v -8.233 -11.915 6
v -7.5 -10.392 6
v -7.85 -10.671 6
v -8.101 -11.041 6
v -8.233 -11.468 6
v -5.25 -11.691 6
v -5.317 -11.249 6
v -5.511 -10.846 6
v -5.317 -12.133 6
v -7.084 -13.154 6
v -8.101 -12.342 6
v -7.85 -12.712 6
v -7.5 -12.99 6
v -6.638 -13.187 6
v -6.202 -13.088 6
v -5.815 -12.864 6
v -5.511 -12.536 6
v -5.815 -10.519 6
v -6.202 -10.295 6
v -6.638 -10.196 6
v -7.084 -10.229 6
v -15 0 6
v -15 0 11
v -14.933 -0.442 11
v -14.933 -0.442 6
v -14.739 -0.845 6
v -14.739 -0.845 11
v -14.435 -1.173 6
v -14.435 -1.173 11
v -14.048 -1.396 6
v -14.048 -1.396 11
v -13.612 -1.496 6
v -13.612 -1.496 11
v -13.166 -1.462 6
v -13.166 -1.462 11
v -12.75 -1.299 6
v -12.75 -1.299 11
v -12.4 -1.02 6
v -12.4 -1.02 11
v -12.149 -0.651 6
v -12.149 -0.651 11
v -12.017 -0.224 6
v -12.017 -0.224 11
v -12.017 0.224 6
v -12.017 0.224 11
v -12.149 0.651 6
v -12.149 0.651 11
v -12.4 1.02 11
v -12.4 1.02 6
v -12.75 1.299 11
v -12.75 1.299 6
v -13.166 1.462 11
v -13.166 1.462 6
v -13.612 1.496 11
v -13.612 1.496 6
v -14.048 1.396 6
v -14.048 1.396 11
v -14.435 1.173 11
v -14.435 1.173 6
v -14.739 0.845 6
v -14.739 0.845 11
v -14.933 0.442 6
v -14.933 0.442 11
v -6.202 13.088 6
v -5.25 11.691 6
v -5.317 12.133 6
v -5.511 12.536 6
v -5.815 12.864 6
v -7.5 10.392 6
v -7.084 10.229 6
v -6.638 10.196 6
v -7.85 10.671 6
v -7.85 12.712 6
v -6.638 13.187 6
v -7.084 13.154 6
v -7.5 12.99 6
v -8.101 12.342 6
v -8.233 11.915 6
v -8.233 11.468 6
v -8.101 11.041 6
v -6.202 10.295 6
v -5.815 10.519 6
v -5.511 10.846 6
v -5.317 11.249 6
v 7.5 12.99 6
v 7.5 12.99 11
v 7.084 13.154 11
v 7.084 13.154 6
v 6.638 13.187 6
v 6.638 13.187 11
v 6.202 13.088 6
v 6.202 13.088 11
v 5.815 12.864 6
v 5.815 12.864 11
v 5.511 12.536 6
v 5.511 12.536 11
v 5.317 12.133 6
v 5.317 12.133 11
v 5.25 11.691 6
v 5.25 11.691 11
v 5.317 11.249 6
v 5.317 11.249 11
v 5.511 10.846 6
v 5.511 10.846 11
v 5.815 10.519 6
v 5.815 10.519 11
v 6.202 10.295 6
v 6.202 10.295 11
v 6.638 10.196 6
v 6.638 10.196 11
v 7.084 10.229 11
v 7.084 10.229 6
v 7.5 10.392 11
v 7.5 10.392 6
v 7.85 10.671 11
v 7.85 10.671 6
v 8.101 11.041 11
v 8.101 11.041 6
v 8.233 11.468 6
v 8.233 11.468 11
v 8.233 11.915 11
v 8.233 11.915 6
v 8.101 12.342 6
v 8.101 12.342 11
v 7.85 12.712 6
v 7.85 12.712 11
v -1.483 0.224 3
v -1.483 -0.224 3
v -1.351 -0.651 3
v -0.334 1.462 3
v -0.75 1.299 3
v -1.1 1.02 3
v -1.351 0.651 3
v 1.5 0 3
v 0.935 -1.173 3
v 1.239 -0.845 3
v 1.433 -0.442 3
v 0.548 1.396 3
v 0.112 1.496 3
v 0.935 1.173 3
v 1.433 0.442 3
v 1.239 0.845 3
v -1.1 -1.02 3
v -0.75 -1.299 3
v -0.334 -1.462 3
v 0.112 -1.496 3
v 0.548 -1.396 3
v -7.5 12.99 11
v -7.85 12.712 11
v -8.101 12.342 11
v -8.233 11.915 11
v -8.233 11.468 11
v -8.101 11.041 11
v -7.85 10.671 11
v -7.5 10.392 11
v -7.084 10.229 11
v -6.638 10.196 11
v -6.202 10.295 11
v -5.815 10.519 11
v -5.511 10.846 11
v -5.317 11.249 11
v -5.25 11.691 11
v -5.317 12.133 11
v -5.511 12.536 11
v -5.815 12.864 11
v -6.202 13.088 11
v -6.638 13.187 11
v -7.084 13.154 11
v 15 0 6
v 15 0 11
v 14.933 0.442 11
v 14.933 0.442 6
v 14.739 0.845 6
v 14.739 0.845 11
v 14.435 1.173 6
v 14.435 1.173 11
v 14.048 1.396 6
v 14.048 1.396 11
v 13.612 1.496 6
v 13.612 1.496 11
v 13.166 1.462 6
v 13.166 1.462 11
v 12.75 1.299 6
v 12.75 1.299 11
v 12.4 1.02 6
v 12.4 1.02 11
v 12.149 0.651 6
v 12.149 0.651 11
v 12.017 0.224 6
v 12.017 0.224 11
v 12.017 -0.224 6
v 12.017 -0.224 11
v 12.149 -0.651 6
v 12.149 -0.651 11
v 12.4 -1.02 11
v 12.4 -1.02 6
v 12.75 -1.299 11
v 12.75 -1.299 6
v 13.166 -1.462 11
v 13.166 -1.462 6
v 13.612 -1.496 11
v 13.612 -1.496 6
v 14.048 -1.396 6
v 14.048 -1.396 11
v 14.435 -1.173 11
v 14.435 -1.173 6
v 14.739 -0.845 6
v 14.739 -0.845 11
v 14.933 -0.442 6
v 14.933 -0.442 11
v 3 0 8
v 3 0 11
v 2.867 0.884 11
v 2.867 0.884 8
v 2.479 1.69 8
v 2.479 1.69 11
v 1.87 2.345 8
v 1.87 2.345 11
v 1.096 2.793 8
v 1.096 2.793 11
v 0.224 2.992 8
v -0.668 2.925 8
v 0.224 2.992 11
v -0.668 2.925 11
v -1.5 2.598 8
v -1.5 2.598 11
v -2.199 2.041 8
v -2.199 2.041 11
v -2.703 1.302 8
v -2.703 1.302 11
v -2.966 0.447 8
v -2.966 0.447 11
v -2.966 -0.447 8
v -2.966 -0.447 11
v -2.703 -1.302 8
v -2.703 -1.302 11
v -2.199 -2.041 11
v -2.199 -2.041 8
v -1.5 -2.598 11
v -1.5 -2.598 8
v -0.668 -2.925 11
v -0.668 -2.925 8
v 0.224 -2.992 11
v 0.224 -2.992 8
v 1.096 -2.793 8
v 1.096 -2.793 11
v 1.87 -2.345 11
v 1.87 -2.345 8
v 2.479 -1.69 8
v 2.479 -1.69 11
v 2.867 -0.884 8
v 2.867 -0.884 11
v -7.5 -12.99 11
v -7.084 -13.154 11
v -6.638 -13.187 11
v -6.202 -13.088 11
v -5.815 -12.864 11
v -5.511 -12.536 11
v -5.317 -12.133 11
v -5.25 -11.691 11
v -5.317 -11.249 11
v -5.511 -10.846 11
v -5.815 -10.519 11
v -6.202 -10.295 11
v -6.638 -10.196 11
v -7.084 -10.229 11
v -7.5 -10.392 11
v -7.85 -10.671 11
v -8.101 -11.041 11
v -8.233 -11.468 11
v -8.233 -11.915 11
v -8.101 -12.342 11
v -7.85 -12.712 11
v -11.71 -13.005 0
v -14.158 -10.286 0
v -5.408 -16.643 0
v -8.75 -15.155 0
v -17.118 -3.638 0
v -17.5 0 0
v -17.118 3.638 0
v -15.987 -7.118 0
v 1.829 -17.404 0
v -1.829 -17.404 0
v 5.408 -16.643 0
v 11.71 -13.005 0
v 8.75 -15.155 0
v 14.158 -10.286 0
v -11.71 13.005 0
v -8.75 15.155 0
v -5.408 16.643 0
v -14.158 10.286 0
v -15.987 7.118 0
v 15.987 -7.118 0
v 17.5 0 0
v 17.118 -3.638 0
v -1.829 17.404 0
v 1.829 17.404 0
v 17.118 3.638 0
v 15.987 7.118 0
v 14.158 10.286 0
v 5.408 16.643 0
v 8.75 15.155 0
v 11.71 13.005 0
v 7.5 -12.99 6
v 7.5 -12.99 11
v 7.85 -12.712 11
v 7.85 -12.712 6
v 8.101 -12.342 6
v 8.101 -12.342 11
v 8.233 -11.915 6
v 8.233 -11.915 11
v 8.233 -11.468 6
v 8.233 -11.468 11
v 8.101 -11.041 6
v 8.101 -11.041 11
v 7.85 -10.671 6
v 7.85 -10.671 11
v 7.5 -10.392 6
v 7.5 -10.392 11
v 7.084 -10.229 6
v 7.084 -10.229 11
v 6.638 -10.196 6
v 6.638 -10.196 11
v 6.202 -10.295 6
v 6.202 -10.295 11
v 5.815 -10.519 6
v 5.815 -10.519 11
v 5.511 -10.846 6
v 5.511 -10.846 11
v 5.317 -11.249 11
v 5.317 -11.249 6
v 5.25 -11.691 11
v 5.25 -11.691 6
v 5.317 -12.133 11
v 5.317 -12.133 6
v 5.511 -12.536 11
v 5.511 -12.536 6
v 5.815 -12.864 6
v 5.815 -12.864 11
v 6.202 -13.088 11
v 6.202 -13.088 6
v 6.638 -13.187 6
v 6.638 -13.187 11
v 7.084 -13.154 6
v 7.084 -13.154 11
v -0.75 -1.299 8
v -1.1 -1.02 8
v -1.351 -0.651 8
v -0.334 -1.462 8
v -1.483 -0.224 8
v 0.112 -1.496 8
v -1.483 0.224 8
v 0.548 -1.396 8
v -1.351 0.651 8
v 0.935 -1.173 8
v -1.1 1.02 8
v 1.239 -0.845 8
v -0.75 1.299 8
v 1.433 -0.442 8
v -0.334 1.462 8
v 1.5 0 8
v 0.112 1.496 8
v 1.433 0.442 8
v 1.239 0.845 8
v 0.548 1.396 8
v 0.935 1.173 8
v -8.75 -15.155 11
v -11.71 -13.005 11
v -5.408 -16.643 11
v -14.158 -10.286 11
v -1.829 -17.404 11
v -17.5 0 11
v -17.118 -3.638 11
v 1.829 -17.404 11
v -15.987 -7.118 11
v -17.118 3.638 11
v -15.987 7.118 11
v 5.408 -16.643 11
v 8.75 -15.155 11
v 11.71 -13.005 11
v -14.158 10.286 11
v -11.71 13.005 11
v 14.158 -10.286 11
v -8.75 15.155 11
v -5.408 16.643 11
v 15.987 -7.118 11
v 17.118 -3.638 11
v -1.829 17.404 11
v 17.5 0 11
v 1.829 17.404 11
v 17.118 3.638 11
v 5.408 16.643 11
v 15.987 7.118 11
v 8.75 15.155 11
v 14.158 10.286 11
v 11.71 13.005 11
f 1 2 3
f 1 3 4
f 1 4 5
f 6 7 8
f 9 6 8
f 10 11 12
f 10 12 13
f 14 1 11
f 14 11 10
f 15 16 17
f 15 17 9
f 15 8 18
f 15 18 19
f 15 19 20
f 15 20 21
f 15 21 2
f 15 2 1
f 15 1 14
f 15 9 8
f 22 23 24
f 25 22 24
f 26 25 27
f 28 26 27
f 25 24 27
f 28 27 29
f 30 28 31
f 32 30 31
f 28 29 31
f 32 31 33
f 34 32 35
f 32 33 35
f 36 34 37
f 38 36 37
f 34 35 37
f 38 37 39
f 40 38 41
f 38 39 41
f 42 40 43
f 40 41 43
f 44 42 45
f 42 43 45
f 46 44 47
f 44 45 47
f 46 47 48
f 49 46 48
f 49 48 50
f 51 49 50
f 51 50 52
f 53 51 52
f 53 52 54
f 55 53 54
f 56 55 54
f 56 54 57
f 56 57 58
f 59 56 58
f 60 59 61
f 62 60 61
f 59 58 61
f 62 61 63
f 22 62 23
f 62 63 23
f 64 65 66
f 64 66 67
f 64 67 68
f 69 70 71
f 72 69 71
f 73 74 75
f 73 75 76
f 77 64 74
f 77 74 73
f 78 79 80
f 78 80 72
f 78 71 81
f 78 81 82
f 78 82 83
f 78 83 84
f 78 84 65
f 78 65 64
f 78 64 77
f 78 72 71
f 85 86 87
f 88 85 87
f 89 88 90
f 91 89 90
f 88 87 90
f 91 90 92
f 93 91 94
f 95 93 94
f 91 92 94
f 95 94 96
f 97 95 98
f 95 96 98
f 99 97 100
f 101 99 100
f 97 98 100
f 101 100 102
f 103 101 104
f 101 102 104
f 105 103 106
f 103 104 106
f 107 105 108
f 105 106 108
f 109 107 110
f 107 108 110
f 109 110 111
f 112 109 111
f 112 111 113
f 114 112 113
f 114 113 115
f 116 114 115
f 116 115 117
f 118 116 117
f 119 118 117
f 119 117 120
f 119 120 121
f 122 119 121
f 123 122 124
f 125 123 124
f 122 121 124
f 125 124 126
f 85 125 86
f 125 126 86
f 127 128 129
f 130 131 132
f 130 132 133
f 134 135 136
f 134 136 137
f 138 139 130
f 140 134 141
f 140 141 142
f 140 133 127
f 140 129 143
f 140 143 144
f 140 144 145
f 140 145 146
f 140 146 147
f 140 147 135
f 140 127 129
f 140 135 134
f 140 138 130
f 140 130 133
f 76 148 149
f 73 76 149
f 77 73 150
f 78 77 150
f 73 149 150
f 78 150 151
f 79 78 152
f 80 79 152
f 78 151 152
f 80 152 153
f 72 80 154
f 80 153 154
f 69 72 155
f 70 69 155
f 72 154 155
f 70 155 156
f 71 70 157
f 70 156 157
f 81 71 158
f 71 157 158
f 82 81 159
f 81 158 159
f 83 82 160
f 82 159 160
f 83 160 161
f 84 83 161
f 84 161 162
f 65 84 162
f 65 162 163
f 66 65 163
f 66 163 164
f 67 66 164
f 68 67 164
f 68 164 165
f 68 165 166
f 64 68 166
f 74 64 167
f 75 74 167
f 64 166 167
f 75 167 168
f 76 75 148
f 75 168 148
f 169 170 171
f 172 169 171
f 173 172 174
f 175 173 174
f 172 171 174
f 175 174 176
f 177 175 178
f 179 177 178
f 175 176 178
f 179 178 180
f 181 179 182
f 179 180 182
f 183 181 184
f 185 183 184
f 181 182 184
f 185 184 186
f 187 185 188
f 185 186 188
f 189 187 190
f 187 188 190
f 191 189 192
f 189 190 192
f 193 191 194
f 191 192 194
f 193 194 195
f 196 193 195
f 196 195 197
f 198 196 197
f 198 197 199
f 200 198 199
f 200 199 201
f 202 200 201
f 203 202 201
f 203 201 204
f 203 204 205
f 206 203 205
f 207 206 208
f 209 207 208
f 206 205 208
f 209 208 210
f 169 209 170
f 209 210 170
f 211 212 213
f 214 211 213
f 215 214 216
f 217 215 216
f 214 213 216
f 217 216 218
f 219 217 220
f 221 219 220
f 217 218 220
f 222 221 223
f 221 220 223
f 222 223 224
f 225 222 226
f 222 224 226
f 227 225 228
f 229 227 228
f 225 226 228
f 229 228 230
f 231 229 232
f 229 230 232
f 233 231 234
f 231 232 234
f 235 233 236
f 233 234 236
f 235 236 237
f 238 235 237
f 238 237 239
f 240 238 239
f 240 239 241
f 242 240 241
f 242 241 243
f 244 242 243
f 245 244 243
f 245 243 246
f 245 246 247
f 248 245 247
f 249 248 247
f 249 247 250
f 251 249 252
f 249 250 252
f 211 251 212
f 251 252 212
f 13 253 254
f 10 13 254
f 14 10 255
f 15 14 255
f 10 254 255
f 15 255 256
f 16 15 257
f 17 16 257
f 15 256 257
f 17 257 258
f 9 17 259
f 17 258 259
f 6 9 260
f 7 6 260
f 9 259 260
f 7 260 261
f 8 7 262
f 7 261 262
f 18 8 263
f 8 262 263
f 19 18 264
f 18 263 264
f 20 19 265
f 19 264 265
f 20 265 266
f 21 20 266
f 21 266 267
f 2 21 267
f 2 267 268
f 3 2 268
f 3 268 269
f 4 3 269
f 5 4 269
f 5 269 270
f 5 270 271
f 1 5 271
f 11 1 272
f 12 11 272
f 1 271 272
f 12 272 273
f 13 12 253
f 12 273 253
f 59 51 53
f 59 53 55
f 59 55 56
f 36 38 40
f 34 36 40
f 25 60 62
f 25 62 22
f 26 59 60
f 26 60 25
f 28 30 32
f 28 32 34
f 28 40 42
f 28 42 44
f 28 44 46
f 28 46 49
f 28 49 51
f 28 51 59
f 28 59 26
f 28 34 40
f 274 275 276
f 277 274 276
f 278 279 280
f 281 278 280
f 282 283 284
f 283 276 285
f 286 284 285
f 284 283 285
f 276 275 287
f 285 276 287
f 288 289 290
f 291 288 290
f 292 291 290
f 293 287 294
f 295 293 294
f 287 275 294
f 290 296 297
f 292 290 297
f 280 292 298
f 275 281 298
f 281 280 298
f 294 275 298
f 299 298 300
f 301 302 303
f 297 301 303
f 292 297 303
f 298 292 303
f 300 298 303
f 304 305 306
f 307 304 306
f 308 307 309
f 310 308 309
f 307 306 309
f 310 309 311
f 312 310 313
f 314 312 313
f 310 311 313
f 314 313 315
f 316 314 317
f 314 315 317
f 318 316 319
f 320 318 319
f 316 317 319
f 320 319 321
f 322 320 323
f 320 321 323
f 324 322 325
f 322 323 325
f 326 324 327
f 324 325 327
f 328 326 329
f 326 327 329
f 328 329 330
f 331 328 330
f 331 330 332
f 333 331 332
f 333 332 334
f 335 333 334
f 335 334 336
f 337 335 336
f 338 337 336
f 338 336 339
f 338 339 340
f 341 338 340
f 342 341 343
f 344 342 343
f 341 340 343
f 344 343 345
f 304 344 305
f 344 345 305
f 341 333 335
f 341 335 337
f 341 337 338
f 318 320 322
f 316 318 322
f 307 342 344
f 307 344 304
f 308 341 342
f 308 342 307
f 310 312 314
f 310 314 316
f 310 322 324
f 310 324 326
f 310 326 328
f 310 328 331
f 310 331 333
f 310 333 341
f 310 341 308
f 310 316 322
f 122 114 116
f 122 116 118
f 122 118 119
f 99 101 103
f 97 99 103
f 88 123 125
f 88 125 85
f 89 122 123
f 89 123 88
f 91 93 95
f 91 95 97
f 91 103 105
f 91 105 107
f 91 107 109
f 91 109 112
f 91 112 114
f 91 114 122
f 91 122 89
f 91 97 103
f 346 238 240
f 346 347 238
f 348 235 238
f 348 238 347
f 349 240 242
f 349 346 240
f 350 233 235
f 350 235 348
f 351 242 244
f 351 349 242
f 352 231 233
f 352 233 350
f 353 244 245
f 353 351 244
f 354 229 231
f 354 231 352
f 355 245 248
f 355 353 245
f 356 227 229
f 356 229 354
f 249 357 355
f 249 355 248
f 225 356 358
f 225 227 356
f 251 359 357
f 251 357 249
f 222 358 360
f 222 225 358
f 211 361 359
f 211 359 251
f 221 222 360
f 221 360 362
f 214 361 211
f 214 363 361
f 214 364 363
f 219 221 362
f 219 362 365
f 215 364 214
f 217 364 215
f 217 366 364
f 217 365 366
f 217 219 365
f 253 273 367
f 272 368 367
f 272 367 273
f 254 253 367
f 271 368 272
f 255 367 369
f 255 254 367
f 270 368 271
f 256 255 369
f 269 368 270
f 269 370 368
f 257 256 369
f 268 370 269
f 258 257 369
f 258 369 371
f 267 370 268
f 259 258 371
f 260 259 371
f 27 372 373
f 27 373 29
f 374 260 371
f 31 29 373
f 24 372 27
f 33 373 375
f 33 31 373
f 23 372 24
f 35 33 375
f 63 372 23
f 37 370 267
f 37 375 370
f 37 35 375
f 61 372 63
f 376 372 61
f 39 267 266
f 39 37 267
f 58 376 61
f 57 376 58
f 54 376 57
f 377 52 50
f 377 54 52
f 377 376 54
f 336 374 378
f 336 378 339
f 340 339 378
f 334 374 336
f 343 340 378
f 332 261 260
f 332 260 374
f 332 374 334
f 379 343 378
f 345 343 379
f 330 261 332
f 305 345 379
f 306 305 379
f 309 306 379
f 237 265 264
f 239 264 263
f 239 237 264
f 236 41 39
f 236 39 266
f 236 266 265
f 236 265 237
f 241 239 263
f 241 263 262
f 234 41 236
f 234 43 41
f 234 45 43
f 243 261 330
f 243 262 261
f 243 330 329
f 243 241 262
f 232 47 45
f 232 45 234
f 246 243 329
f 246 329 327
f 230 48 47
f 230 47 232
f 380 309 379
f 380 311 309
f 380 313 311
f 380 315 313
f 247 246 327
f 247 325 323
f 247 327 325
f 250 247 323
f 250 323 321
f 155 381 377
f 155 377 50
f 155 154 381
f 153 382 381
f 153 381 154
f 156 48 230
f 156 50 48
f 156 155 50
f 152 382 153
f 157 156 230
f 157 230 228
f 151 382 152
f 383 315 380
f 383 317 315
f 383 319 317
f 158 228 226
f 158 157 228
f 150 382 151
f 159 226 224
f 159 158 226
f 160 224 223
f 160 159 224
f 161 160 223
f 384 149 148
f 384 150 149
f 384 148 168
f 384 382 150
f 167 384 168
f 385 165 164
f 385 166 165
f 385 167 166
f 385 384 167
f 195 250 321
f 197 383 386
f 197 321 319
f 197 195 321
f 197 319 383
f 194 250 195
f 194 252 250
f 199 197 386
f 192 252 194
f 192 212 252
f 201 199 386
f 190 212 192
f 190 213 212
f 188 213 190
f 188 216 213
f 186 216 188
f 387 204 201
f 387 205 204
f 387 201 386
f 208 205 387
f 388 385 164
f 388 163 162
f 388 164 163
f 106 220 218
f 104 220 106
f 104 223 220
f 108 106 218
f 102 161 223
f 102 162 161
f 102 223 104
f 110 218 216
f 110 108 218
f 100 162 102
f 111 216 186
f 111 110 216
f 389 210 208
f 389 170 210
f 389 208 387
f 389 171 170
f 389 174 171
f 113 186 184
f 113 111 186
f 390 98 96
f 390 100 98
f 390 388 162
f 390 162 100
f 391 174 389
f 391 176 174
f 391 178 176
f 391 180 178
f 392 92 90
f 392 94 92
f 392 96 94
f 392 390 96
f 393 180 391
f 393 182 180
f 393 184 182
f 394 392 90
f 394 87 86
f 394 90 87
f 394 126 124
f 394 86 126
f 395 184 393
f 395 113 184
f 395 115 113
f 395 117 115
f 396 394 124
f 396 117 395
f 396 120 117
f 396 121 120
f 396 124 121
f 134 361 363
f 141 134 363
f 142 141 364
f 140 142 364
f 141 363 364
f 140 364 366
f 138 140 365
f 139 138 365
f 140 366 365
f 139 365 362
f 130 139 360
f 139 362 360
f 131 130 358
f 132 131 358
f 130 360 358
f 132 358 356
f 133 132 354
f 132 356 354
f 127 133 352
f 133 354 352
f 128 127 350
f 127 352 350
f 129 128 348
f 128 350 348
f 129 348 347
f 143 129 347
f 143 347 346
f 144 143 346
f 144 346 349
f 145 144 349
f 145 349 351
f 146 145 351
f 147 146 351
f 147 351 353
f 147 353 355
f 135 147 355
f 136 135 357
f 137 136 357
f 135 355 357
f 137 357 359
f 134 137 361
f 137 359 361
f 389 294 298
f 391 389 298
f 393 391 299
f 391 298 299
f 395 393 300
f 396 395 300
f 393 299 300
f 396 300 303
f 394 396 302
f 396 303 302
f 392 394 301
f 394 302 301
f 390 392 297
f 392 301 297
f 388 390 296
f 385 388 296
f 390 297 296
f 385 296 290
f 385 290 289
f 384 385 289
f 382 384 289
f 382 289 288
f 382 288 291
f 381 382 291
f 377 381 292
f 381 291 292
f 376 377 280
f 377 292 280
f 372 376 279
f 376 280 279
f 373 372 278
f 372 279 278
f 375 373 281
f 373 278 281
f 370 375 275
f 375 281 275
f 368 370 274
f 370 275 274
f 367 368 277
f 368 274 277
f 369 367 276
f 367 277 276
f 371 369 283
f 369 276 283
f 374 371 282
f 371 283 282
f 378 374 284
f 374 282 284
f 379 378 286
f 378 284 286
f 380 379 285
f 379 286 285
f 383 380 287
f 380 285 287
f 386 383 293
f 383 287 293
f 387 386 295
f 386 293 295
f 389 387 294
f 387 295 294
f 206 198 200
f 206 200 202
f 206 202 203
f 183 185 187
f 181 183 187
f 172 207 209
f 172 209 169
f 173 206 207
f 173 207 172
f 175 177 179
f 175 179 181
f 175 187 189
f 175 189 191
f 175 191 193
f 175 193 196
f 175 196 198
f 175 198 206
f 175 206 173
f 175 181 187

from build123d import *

# Parameters (mm, degrees)
SKETCH_1_R               = 17.5
EXTRUDE_1_DEPTH          = 11
SKETCH_2_R               = 1.5
CUT_EXTRUDE_1_DEPTH      = 5
PATTERN_CIRCULAR_1_COUNT = 6
SKETCH_3_R               = 3
CUT_EXTRUDE_2_DEPTH      = 3
SKETCH_4_R               = 1.5
CUT_EXTRUDE_3_DEPTH      = 5


with BuildPart() as part:
    # 草图1 → 凸台-拉伸1 (new body)
    with BuildSketch(Plane.XY):
        Circle(SKETCH_1_R)
    extrude(amount=EXTRUDE_1_DEPTH)

    # 草图2 → 切除-拉伸1 (cut)
    with BuildSketch(Plane.XY.offset(11)):
        with Locations((13.5, 0)):
            Circle(SKETCH_2_R)
    cut_extrude_1 = extrude(amount=-CUT_EXTRUDE_1_DEPTH, mode=Mode.SUBTRACT)

    # 阵列(圆周)1: 切除-拉伸1 ×6 about axis
    pattern_circular_1_axis = Axis((0, 0, 0), (0, 0, 1))
    for i in range(1, PATTERN_CIRCULAR_1_COUNT):
        add(cut_extrude_1.rotate(pattern_circular_1_axis, i * 360 / PATTERN_CIRCULAR_1_COUNT), mode=Mode.SUBTRACT)

    # 草图3 → 切除-拉伸2 (cut)
    with BuildSketch(Plane.XY.offset(11)):
        Circle(SKETCH_3_R)
    extrude(amount=-CUT_EXTRUDE_2_DEPTH, mode=Mode.SUBTRACT)

    # 草图4 → 切除-拉伸3 (cut)
    with BuildSketch(Plane.XY.offset(8)):
        Circle(SKETCH_4_R)
    extrude(amount=-CUT_EXTRUDE_3_DEPTH, mode=Mode.SUBTRACT)


solid = part.part
